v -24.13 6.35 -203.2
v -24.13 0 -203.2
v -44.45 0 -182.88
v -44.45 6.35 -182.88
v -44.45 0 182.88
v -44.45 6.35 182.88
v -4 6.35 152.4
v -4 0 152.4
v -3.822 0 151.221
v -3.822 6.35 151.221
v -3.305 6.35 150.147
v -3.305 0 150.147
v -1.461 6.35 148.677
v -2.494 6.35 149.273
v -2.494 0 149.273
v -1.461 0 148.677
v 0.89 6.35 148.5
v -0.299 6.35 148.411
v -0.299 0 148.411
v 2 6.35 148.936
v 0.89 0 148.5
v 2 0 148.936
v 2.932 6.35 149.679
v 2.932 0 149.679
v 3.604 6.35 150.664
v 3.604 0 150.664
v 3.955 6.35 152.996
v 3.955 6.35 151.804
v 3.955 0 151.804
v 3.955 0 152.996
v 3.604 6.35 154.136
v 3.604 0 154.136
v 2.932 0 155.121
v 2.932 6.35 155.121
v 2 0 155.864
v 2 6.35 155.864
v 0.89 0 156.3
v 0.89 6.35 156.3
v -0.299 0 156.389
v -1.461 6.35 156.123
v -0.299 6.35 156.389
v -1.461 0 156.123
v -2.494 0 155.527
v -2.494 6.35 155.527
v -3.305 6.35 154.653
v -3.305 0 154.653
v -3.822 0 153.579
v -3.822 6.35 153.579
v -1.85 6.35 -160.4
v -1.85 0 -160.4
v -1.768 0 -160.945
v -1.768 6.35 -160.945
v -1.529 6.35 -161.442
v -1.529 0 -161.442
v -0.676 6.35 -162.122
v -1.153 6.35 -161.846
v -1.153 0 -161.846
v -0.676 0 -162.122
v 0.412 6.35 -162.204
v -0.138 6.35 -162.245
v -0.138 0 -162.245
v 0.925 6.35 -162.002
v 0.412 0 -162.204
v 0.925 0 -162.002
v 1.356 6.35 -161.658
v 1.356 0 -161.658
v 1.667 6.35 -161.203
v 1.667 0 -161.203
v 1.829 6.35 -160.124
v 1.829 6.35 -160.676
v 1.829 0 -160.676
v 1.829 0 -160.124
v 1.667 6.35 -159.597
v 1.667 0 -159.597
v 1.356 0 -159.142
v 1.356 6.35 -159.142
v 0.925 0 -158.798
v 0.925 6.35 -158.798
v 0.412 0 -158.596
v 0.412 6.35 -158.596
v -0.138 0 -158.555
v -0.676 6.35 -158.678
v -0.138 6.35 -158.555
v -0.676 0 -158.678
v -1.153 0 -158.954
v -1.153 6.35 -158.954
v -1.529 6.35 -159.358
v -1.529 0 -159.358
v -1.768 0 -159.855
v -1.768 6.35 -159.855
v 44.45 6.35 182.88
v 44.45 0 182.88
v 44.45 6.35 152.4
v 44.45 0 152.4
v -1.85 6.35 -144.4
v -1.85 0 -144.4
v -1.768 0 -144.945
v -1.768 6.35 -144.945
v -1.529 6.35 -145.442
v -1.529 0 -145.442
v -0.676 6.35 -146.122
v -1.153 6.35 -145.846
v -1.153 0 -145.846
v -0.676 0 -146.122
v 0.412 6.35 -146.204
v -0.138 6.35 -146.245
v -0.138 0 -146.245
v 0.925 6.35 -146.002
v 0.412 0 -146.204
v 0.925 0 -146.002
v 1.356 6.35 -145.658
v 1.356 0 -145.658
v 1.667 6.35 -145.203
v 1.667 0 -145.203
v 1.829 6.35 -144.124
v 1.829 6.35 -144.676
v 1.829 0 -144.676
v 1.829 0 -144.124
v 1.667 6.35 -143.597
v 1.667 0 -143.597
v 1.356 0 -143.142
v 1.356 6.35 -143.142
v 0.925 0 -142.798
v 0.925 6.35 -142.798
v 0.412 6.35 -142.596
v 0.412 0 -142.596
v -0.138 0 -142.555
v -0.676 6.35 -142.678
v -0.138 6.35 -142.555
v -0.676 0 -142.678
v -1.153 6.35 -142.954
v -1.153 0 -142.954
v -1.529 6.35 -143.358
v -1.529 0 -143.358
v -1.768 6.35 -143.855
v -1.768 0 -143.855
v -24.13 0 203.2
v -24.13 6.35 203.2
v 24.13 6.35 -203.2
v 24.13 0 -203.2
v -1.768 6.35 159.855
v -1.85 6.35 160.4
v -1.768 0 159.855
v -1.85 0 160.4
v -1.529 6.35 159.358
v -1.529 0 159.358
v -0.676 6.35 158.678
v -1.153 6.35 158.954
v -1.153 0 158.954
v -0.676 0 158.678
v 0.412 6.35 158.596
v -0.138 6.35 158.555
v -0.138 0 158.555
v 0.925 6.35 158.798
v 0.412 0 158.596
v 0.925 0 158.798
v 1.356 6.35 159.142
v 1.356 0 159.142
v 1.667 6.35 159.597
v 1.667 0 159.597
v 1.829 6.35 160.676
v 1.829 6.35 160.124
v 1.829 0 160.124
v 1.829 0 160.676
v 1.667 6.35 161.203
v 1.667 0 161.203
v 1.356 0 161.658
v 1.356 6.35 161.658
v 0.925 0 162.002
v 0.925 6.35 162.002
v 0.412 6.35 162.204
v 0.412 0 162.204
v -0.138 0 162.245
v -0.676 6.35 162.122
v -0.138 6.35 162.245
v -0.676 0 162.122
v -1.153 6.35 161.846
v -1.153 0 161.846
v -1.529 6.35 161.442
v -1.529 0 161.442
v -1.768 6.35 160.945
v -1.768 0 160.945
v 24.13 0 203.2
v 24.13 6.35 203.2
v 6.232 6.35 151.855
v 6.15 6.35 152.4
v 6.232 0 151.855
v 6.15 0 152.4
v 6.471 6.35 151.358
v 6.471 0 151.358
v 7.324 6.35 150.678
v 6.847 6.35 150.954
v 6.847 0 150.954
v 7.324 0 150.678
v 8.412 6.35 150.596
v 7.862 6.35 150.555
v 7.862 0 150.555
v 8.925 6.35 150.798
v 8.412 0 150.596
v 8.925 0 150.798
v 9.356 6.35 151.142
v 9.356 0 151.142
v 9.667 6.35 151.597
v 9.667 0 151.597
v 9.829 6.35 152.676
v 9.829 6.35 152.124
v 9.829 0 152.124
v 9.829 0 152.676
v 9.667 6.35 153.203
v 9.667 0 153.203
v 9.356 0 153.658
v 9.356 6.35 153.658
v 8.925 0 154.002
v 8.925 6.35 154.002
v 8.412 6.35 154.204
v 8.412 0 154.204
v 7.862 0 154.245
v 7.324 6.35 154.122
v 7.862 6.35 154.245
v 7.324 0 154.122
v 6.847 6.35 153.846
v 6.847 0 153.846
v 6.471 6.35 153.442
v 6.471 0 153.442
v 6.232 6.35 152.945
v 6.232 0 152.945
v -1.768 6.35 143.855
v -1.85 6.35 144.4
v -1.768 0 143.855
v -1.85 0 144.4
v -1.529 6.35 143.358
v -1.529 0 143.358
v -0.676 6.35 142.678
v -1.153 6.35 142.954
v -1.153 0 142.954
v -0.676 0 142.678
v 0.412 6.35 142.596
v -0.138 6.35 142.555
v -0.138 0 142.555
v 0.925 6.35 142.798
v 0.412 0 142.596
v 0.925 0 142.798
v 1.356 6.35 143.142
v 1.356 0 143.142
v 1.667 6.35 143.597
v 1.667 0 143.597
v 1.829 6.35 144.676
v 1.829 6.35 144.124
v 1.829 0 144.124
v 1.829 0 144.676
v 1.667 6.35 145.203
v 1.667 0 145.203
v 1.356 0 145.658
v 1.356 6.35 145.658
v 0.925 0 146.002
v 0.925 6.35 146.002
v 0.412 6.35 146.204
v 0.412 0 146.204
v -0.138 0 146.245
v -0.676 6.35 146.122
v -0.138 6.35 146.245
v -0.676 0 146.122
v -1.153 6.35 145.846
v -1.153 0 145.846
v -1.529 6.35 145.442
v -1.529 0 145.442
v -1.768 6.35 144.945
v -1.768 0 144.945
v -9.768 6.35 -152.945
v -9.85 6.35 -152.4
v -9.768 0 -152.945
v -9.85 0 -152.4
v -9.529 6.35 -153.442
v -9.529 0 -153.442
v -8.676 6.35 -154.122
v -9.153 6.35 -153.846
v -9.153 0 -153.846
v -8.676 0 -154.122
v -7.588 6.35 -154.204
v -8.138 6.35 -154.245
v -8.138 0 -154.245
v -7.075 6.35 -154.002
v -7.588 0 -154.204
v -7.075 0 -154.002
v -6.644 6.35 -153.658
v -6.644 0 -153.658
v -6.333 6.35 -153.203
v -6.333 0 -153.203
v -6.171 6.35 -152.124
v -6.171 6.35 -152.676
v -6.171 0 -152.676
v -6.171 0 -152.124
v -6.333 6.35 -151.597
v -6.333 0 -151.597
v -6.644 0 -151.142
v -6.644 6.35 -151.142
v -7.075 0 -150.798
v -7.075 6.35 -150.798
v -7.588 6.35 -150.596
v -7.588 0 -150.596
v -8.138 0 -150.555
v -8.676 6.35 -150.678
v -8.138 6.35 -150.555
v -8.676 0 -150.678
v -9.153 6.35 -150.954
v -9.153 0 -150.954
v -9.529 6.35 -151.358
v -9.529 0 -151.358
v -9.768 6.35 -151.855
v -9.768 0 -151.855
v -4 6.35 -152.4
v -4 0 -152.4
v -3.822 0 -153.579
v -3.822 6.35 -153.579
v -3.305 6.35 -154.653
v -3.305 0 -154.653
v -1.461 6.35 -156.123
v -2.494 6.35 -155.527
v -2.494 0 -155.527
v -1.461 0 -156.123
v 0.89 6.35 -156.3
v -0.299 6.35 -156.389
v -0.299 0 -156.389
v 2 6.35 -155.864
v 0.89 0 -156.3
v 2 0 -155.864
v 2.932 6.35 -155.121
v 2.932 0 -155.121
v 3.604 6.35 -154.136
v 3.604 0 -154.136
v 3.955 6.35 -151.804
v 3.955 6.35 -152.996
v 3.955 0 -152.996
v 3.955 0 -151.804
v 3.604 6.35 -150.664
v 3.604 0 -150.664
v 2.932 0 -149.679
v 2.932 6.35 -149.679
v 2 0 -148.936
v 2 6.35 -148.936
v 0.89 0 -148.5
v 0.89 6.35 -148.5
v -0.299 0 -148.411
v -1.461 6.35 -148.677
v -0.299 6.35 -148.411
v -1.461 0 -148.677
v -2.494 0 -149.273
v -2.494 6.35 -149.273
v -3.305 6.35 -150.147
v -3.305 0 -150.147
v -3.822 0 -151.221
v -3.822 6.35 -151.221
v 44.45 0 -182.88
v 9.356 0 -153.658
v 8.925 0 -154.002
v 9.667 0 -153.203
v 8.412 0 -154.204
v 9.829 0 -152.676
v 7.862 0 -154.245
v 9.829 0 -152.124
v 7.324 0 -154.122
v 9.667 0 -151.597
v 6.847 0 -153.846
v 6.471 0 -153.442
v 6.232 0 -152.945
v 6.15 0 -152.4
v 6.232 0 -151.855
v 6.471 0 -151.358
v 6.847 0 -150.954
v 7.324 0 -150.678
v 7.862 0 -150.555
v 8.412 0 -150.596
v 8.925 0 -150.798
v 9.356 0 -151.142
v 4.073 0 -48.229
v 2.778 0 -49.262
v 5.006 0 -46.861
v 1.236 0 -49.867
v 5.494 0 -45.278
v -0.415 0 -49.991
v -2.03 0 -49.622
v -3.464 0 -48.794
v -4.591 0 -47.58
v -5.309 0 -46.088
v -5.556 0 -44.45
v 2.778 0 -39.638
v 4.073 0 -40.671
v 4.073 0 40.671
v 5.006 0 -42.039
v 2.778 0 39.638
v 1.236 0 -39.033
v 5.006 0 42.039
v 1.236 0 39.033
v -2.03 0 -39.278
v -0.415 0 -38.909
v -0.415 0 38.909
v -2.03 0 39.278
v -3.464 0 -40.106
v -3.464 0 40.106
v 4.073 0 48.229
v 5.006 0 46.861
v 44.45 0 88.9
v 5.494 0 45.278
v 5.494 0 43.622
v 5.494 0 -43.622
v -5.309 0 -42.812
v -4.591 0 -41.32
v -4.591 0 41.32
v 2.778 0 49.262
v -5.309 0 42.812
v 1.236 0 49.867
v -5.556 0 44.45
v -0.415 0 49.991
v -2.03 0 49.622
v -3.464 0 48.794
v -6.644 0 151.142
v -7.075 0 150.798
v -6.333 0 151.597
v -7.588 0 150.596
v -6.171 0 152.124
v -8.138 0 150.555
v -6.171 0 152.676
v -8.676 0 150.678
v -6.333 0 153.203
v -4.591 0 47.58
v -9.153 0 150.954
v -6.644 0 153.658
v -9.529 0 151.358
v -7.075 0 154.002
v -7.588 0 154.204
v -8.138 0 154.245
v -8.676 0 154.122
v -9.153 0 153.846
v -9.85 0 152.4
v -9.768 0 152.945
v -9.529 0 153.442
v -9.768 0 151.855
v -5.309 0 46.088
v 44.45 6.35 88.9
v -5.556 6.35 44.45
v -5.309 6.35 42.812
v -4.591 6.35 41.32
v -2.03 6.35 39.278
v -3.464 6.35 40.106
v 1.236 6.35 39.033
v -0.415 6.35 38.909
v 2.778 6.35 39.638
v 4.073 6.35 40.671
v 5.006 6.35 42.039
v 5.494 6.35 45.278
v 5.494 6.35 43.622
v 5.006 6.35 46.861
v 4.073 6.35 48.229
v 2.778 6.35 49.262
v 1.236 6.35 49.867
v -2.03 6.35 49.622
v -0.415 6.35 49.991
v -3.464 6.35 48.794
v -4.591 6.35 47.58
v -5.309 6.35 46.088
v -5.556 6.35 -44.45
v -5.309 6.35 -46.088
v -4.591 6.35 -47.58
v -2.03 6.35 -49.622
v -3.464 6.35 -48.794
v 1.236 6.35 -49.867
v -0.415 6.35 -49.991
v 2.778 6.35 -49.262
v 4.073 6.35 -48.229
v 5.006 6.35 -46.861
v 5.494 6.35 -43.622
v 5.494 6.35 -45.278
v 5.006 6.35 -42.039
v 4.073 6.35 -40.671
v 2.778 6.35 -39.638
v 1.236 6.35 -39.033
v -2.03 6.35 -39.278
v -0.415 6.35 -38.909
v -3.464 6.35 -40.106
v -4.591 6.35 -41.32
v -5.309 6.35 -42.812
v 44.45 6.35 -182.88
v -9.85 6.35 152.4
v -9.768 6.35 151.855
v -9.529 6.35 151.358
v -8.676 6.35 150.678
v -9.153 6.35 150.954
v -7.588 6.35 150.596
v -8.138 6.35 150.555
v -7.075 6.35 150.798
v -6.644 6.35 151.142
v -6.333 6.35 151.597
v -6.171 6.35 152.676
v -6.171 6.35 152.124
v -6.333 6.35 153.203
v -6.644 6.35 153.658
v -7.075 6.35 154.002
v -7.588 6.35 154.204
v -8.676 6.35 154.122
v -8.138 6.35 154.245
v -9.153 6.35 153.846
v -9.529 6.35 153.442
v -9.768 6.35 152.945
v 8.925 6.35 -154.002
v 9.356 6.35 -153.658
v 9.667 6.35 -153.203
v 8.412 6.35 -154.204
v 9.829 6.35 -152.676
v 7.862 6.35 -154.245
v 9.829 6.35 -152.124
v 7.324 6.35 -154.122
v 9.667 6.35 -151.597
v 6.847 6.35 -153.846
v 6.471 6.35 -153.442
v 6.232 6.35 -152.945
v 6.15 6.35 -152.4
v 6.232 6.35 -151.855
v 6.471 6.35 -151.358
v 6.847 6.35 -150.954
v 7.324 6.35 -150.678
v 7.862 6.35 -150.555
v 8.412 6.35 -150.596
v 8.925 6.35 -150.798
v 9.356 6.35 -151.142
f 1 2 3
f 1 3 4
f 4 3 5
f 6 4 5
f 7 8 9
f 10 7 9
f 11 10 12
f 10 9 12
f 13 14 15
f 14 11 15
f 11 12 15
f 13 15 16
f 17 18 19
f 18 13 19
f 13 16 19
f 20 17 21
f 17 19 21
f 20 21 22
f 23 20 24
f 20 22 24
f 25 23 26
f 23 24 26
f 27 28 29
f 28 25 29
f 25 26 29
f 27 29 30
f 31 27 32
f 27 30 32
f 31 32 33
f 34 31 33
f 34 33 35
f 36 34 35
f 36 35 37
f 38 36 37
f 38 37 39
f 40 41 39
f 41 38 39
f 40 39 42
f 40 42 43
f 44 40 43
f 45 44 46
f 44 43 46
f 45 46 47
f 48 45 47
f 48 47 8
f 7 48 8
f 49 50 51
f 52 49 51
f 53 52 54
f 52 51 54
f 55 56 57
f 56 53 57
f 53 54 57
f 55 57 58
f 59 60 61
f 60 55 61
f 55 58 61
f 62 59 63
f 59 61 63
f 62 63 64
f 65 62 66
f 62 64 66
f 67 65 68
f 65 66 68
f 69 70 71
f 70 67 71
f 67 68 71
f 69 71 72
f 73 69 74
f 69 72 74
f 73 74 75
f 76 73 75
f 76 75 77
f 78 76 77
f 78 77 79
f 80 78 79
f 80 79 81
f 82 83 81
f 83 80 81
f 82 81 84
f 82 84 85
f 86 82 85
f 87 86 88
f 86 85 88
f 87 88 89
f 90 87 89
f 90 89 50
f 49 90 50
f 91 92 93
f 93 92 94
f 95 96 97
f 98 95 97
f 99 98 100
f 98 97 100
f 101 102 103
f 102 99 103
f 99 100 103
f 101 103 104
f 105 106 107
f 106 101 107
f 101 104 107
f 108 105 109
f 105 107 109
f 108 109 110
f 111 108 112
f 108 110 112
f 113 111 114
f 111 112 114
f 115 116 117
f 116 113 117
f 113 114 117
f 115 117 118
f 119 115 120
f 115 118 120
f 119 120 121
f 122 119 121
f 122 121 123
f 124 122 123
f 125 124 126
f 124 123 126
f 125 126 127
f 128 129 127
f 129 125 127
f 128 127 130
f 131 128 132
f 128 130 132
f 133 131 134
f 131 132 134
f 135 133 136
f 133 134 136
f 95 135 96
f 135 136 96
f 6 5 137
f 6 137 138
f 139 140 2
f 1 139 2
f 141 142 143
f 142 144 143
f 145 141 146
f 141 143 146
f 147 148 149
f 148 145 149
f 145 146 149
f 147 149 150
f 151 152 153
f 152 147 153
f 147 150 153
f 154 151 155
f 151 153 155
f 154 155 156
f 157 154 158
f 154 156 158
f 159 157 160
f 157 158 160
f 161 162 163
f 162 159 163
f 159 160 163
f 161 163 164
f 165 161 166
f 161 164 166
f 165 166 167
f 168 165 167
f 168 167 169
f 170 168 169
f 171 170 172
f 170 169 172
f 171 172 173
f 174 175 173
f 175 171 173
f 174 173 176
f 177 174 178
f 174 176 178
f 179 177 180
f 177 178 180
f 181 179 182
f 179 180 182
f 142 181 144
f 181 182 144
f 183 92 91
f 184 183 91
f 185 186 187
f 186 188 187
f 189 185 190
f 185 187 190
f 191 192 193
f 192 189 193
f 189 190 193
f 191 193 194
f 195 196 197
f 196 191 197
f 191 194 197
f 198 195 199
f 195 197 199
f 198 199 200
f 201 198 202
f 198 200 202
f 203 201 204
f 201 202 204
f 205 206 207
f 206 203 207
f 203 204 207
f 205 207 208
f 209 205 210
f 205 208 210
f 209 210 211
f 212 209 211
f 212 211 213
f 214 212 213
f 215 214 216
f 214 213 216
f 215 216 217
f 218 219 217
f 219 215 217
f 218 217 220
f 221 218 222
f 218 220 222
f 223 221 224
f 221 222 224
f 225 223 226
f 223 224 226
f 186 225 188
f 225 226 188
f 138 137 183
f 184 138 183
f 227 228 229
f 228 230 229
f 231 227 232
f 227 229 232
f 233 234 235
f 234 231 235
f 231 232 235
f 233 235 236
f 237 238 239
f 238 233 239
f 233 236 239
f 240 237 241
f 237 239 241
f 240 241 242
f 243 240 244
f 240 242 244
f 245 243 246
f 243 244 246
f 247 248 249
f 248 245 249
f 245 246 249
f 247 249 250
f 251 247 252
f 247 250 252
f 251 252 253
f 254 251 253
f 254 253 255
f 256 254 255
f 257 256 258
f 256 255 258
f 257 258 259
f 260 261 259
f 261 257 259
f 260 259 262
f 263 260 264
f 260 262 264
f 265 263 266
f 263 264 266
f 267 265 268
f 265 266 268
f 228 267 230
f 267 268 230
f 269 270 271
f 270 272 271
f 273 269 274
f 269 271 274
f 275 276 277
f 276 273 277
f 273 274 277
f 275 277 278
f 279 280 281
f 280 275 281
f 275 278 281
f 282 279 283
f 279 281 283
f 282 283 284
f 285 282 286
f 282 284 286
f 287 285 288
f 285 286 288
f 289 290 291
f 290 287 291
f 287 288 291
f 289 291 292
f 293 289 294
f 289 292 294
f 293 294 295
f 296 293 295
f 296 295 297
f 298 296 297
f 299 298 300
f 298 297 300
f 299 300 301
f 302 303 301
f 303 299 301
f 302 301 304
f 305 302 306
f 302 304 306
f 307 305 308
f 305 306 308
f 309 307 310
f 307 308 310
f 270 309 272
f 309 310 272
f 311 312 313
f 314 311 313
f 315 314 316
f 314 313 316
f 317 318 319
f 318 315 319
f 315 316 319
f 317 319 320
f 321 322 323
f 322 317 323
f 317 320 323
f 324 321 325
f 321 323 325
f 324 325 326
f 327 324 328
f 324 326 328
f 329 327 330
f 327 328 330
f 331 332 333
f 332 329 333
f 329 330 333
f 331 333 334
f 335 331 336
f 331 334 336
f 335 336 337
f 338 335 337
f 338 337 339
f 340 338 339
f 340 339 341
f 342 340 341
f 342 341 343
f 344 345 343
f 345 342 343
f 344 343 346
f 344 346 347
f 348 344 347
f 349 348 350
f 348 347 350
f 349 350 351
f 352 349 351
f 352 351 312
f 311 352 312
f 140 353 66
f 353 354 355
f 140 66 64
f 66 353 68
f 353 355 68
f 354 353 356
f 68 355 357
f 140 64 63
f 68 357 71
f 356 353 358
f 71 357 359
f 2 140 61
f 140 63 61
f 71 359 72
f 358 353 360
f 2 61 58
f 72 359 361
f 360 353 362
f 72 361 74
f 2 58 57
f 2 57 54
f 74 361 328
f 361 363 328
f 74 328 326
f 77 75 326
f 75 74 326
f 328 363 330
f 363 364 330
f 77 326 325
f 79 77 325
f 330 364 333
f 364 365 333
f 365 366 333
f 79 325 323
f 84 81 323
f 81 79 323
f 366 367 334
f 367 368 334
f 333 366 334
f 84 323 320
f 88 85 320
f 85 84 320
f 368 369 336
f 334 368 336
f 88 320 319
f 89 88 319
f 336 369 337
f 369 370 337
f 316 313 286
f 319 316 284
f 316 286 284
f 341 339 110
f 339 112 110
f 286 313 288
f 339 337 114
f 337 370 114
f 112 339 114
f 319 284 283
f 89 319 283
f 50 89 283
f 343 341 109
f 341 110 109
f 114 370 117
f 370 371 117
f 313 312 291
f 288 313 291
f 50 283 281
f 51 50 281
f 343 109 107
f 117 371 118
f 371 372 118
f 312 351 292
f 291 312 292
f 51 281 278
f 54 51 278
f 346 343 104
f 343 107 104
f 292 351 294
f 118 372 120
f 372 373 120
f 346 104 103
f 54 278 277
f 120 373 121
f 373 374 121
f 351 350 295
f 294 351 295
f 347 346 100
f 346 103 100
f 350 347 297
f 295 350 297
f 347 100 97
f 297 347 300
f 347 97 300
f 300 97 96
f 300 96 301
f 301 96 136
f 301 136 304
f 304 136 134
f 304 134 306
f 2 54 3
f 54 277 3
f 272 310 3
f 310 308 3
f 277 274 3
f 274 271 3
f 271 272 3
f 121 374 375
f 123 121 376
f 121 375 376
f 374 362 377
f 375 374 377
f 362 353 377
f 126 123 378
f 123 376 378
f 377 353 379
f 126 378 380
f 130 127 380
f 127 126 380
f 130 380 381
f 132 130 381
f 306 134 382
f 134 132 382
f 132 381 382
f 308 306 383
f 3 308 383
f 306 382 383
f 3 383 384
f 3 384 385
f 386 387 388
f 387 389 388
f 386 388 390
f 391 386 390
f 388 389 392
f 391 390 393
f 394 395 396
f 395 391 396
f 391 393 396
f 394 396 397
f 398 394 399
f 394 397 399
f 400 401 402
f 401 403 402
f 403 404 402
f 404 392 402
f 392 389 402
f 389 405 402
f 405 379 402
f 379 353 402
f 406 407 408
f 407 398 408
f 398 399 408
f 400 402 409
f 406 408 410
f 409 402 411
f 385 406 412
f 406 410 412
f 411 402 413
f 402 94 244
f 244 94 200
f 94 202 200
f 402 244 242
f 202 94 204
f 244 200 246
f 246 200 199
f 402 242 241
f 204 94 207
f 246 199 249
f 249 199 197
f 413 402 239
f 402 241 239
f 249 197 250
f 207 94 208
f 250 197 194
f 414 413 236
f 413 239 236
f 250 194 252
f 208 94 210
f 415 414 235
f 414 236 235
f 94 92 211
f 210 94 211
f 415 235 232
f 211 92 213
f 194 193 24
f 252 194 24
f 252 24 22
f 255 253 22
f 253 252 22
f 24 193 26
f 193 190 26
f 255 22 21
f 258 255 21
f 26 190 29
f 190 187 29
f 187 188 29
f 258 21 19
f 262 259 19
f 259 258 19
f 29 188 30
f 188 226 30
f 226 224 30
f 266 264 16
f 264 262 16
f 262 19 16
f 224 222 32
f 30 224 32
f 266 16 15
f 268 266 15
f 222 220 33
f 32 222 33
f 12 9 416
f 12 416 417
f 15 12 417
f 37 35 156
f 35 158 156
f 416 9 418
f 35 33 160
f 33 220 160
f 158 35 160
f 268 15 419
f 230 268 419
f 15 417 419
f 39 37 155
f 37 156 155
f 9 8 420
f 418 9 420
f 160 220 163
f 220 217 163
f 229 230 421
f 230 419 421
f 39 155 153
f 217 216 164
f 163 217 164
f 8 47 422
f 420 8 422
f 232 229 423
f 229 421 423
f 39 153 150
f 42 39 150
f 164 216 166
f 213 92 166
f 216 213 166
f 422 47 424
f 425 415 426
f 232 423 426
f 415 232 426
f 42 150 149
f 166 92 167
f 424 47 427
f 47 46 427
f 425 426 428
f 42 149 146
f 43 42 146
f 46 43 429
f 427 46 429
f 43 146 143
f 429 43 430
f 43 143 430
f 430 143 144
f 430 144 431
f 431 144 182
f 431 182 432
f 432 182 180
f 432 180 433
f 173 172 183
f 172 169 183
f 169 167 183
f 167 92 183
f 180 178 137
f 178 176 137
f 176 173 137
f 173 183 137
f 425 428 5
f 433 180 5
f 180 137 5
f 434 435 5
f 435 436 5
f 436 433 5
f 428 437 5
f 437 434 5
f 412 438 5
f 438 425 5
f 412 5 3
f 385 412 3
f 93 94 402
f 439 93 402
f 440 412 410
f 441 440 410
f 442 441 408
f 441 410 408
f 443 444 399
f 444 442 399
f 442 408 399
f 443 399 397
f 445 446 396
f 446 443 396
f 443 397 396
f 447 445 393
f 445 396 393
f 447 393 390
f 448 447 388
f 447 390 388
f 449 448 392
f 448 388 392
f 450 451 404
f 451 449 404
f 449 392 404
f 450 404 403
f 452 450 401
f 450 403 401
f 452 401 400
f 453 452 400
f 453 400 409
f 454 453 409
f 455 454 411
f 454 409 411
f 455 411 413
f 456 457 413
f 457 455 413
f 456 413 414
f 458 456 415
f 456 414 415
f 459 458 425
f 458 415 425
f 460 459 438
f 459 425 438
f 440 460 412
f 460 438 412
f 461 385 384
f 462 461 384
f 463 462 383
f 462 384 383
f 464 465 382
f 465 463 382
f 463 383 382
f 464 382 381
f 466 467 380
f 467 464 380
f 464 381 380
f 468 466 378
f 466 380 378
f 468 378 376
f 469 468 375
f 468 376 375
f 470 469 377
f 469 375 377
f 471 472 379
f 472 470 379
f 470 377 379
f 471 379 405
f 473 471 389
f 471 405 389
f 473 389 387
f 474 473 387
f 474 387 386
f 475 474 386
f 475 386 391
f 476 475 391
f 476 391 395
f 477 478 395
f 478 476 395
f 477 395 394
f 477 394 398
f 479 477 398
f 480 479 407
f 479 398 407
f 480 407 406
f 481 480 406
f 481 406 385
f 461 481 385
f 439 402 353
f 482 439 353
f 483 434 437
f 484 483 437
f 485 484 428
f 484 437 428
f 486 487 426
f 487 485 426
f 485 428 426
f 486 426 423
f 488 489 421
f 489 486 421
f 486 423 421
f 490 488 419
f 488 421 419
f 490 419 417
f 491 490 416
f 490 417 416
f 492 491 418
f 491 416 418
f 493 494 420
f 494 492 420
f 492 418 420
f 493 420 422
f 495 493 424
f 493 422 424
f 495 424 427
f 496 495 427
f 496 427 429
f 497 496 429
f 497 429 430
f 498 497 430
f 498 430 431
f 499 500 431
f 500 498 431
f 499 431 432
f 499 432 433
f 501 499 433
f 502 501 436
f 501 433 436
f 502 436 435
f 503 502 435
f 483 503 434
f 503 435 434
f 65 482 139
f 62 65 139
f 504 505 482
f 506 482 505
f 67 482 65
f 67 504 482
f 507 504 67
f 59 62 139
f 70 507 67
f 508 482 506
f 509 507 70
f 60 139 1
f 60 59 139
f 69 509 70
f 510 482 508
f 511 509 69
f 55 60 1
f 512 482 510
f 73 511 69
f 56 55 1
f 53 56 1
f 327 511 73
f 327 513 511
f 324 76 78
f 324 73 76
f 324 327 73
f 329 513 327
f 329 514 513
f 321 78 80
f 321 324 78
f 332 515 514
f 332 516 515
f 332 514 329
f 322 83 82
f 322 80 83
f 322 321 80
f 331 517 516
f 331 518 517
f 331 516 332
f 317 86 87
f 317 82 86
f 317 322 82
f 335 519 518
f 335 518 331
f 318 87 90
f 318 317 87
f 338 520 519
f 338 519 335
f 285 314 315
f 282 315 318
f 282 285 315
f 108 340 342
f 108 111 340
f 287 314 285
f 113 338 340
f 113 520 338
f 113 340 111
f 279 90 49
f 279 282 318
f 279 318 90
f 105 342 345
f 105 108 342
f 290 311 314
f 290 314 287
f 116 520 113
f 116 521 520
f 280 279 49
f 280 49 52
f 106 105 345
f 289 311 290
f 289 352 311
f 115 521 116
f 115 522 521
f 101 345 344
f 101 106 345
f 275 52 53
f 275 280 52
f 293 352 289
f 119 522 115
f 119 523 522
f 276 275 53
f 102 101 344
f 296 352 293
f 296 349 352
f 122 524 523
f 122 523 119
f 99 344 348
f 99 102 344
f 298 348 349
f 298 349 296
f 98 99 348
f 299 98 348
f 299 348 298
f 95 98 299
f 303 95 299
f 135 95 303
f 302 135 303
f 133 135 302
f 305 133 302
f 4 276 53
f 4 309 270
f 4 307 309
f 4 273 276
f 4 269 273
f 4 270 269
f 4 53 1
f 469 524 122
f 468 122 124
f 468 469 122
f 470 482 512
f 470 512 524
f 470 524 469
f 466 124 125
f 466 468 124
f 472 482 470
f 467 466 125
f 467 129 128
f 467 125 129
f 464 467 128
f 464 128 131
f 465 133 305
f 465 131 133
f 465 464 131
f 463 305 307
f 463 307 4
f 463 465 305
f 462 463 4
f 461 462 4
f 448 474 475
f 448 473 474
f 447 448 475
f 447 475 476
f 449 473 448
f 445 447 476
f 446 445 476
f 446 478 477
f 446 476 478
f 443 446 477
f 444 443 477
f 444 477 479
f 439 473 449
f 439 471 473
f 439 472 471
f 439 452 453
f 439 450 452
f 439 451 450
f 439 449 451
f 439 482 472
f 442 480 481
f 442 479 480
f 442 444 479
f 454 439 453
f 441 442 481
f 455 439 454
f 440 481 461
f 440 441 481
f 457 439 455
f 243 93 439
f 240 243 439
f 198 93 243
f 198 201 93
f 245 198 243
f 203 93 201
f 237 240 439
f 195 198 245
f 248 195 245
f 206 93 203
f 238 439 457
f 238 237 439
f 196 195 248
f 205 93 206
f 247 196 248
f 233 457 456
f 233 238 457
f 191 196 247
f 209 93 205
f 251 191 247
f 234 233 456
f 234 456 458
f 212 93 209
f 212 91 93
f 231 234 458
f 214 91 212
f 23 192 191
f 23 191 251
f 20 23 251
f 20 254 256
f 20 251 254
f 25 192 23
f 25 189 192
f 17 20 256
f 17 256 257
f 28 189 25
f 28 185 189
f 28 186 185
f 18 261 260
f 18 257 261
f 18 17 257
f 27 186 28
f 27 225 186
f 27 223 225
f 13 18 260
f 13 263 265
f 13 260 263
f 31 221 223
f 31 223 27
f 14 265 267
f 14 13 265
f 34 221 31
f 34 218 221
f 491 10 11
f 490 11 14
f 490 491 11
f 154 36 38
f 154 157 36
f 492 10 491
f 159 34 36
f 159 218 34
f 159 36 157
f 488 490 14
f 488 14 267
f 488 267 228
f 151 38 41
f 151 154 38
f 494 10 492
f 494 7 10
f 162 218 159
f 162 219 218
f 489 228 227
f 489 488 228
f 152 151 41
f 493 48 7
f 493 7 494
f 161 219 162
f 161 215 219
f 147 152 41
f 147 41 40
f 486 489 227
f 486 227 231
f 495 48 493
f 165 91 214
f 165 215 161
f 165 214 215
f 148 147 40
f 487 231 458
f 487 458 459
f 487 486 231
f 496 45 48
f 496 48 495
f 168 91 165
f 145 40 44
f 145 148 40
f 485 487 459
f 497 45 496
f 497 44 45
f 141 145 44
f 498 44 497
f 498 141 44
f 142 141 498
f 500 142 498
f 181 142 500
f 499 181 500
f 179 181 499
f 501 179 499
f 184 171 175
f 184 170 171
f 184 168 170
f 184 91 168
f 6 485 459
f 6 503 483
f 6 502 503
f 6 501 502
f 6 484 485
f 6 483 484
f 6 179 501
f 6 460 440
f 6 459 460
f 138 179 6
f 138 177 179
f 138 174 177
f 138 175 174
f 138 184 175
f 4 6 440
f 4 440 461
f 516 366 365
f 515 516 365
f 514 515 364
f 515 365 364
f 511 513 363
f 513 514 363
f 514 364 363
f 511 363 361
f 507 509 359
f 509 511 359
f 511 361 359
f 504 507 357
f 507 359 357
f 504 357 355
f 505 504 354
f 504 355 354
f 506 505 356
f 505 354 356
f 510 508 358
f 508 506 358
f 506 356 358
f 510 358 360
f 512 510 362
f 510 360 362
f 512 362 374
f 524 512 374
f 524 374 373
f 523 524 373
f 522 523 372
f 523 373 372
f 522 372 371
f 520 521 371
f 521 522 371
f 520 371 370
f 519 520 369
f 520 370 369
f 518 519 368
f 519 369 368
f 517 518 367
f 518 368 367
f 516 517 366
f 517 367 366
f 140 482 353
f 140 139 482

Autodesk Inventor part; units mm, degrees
ref_plane "YZ Plane" through (0, 0, 0) normal (1, 0, 0) x (0, 1, 0)
ref_plane "XZ Plane" through (0, 0, 0) normal (0, 1, 0) x (-1, 0, 0)
ref_plane "XY Plane" through (0, 0, 0) normal (0, 0, 1) x (1, 0, 0)
sketch "Sketch1" plane through (0, 0, 0) normal (0, 1, 0) x (-1, 0, 0)
  line L0 (-44.45, -203.2) -> (44.45, -203.2)
  line L1 (44.45, -203.2) -> (44.45, 203.2)
  line L2 (44.45, 203.2) -> (-44.45, 203.2)
  line L3 (-44.45, 203.2) -> (-44.45, -203.2)
  line L4 (-44.45, -203.2) -> (44.45, 203.2) construction
  line L5 (44.45, -203.2) -> (-44.45, 203.2) construction
  line L6 (0, 203.2) -> (0, -203.2) construction
  line L7 (0, 0) -> (44.45, 0) construction
  line L8 (0, -203.2) -> (0, 203.2) construction
  line L9 (0, 152.4) -> (7.112, 152.4) construction
  line L10 (0, -152.4) -> (0, -203.2) construction
  circle A0 centre (0, -152.4) radius 4
  circle A1 centre (0, -152.4) radius 8 construction
  line L11 (0, 152.4) -> (-44.45, 152.4) construction
  line L12 (-44.45, 152.4) -> (-44.45, 88.9)
  line L13 (-44.45, 88.9) -> (0, 88.9) construction
  line L14 (0, 88.9) -> (0, 152.4) construction
  circle A2 centre (0, -144.4) radius 1.85
  circle A3 centre (-8, -152.4) radius 1.85
  circle A4 centre (0, -160.4) radius 1.85
  circle A5 centre (8, -152.4) radius 1.85
  circle A6 centre (0, 152.4) radius 4
  circle A7 centre (0, 152.4) radius 8 construction
  circle A8 centre (0, 160.4) radius 1.85
  circle A9 centre (0, 152.4) radius 8 construction
  circle A10 centre (-8, 152.4) radius 1.85
  circle A11 centre (0, 152.4) radius 8 construction
  circle A12 centre (0, 144.4) radius 1.85
  circle A13 centre (0, 152.4) radius 8 construction
  circle A14 centre (8, 152.4) radius 1.85
  line L15 (-88.9, 44.45) -> (0, 44.45) construction
  line L16 (0, 44.45) -> (0, -44.45) construction
  line L17 (0, -44.45) -> (-88.9, -44.45) construction
  line L18 (-88.9, -44.45) -> (-88.9, 44.45) construction
  line L19 (-88.9, 44.45) -> (0, -44.45) construction
  line L20 (0, 44.45) -> (-88.9, -44.45) construction
  circle A15 centre (0, 44.45) radius 5.5563
  circle A16 centre (0, -44.45) radius 5.5563
  point P0 (-44.45, 0)
  dimension "d17" = 16
  dimension "d40" = 16
  dimension "d0" = 406.4
  dimension "d1" = 88.9
  dimension "d2" = 152.4
  dimension "d16" = 8
  dimension "d24" = 44.45
  dimension "d25" = 63.5
  dimension "d34" = 3.7
  dimension "d37" = 360
  dimension "d39" = 8
  dimension "d41" = 3.7
  dimension "d44" = 360
  dimension "d63" = 88.9
  dimension "d64" = 11.1125
  dimension "d65" = 11.1125
extrude "Extrusion6" add sketch "Sketch1" along normal blind 6.35
chamfer "Chamfer6" distance 20.32 angle 45 4 edges at (-44.45, 3.175, 203.2) (44.45, 3.175, 203.2) (44.45, 3.175, -203.2) (-44.45, 3.175, -203.2)
properties part number "testPart_chassis2"
